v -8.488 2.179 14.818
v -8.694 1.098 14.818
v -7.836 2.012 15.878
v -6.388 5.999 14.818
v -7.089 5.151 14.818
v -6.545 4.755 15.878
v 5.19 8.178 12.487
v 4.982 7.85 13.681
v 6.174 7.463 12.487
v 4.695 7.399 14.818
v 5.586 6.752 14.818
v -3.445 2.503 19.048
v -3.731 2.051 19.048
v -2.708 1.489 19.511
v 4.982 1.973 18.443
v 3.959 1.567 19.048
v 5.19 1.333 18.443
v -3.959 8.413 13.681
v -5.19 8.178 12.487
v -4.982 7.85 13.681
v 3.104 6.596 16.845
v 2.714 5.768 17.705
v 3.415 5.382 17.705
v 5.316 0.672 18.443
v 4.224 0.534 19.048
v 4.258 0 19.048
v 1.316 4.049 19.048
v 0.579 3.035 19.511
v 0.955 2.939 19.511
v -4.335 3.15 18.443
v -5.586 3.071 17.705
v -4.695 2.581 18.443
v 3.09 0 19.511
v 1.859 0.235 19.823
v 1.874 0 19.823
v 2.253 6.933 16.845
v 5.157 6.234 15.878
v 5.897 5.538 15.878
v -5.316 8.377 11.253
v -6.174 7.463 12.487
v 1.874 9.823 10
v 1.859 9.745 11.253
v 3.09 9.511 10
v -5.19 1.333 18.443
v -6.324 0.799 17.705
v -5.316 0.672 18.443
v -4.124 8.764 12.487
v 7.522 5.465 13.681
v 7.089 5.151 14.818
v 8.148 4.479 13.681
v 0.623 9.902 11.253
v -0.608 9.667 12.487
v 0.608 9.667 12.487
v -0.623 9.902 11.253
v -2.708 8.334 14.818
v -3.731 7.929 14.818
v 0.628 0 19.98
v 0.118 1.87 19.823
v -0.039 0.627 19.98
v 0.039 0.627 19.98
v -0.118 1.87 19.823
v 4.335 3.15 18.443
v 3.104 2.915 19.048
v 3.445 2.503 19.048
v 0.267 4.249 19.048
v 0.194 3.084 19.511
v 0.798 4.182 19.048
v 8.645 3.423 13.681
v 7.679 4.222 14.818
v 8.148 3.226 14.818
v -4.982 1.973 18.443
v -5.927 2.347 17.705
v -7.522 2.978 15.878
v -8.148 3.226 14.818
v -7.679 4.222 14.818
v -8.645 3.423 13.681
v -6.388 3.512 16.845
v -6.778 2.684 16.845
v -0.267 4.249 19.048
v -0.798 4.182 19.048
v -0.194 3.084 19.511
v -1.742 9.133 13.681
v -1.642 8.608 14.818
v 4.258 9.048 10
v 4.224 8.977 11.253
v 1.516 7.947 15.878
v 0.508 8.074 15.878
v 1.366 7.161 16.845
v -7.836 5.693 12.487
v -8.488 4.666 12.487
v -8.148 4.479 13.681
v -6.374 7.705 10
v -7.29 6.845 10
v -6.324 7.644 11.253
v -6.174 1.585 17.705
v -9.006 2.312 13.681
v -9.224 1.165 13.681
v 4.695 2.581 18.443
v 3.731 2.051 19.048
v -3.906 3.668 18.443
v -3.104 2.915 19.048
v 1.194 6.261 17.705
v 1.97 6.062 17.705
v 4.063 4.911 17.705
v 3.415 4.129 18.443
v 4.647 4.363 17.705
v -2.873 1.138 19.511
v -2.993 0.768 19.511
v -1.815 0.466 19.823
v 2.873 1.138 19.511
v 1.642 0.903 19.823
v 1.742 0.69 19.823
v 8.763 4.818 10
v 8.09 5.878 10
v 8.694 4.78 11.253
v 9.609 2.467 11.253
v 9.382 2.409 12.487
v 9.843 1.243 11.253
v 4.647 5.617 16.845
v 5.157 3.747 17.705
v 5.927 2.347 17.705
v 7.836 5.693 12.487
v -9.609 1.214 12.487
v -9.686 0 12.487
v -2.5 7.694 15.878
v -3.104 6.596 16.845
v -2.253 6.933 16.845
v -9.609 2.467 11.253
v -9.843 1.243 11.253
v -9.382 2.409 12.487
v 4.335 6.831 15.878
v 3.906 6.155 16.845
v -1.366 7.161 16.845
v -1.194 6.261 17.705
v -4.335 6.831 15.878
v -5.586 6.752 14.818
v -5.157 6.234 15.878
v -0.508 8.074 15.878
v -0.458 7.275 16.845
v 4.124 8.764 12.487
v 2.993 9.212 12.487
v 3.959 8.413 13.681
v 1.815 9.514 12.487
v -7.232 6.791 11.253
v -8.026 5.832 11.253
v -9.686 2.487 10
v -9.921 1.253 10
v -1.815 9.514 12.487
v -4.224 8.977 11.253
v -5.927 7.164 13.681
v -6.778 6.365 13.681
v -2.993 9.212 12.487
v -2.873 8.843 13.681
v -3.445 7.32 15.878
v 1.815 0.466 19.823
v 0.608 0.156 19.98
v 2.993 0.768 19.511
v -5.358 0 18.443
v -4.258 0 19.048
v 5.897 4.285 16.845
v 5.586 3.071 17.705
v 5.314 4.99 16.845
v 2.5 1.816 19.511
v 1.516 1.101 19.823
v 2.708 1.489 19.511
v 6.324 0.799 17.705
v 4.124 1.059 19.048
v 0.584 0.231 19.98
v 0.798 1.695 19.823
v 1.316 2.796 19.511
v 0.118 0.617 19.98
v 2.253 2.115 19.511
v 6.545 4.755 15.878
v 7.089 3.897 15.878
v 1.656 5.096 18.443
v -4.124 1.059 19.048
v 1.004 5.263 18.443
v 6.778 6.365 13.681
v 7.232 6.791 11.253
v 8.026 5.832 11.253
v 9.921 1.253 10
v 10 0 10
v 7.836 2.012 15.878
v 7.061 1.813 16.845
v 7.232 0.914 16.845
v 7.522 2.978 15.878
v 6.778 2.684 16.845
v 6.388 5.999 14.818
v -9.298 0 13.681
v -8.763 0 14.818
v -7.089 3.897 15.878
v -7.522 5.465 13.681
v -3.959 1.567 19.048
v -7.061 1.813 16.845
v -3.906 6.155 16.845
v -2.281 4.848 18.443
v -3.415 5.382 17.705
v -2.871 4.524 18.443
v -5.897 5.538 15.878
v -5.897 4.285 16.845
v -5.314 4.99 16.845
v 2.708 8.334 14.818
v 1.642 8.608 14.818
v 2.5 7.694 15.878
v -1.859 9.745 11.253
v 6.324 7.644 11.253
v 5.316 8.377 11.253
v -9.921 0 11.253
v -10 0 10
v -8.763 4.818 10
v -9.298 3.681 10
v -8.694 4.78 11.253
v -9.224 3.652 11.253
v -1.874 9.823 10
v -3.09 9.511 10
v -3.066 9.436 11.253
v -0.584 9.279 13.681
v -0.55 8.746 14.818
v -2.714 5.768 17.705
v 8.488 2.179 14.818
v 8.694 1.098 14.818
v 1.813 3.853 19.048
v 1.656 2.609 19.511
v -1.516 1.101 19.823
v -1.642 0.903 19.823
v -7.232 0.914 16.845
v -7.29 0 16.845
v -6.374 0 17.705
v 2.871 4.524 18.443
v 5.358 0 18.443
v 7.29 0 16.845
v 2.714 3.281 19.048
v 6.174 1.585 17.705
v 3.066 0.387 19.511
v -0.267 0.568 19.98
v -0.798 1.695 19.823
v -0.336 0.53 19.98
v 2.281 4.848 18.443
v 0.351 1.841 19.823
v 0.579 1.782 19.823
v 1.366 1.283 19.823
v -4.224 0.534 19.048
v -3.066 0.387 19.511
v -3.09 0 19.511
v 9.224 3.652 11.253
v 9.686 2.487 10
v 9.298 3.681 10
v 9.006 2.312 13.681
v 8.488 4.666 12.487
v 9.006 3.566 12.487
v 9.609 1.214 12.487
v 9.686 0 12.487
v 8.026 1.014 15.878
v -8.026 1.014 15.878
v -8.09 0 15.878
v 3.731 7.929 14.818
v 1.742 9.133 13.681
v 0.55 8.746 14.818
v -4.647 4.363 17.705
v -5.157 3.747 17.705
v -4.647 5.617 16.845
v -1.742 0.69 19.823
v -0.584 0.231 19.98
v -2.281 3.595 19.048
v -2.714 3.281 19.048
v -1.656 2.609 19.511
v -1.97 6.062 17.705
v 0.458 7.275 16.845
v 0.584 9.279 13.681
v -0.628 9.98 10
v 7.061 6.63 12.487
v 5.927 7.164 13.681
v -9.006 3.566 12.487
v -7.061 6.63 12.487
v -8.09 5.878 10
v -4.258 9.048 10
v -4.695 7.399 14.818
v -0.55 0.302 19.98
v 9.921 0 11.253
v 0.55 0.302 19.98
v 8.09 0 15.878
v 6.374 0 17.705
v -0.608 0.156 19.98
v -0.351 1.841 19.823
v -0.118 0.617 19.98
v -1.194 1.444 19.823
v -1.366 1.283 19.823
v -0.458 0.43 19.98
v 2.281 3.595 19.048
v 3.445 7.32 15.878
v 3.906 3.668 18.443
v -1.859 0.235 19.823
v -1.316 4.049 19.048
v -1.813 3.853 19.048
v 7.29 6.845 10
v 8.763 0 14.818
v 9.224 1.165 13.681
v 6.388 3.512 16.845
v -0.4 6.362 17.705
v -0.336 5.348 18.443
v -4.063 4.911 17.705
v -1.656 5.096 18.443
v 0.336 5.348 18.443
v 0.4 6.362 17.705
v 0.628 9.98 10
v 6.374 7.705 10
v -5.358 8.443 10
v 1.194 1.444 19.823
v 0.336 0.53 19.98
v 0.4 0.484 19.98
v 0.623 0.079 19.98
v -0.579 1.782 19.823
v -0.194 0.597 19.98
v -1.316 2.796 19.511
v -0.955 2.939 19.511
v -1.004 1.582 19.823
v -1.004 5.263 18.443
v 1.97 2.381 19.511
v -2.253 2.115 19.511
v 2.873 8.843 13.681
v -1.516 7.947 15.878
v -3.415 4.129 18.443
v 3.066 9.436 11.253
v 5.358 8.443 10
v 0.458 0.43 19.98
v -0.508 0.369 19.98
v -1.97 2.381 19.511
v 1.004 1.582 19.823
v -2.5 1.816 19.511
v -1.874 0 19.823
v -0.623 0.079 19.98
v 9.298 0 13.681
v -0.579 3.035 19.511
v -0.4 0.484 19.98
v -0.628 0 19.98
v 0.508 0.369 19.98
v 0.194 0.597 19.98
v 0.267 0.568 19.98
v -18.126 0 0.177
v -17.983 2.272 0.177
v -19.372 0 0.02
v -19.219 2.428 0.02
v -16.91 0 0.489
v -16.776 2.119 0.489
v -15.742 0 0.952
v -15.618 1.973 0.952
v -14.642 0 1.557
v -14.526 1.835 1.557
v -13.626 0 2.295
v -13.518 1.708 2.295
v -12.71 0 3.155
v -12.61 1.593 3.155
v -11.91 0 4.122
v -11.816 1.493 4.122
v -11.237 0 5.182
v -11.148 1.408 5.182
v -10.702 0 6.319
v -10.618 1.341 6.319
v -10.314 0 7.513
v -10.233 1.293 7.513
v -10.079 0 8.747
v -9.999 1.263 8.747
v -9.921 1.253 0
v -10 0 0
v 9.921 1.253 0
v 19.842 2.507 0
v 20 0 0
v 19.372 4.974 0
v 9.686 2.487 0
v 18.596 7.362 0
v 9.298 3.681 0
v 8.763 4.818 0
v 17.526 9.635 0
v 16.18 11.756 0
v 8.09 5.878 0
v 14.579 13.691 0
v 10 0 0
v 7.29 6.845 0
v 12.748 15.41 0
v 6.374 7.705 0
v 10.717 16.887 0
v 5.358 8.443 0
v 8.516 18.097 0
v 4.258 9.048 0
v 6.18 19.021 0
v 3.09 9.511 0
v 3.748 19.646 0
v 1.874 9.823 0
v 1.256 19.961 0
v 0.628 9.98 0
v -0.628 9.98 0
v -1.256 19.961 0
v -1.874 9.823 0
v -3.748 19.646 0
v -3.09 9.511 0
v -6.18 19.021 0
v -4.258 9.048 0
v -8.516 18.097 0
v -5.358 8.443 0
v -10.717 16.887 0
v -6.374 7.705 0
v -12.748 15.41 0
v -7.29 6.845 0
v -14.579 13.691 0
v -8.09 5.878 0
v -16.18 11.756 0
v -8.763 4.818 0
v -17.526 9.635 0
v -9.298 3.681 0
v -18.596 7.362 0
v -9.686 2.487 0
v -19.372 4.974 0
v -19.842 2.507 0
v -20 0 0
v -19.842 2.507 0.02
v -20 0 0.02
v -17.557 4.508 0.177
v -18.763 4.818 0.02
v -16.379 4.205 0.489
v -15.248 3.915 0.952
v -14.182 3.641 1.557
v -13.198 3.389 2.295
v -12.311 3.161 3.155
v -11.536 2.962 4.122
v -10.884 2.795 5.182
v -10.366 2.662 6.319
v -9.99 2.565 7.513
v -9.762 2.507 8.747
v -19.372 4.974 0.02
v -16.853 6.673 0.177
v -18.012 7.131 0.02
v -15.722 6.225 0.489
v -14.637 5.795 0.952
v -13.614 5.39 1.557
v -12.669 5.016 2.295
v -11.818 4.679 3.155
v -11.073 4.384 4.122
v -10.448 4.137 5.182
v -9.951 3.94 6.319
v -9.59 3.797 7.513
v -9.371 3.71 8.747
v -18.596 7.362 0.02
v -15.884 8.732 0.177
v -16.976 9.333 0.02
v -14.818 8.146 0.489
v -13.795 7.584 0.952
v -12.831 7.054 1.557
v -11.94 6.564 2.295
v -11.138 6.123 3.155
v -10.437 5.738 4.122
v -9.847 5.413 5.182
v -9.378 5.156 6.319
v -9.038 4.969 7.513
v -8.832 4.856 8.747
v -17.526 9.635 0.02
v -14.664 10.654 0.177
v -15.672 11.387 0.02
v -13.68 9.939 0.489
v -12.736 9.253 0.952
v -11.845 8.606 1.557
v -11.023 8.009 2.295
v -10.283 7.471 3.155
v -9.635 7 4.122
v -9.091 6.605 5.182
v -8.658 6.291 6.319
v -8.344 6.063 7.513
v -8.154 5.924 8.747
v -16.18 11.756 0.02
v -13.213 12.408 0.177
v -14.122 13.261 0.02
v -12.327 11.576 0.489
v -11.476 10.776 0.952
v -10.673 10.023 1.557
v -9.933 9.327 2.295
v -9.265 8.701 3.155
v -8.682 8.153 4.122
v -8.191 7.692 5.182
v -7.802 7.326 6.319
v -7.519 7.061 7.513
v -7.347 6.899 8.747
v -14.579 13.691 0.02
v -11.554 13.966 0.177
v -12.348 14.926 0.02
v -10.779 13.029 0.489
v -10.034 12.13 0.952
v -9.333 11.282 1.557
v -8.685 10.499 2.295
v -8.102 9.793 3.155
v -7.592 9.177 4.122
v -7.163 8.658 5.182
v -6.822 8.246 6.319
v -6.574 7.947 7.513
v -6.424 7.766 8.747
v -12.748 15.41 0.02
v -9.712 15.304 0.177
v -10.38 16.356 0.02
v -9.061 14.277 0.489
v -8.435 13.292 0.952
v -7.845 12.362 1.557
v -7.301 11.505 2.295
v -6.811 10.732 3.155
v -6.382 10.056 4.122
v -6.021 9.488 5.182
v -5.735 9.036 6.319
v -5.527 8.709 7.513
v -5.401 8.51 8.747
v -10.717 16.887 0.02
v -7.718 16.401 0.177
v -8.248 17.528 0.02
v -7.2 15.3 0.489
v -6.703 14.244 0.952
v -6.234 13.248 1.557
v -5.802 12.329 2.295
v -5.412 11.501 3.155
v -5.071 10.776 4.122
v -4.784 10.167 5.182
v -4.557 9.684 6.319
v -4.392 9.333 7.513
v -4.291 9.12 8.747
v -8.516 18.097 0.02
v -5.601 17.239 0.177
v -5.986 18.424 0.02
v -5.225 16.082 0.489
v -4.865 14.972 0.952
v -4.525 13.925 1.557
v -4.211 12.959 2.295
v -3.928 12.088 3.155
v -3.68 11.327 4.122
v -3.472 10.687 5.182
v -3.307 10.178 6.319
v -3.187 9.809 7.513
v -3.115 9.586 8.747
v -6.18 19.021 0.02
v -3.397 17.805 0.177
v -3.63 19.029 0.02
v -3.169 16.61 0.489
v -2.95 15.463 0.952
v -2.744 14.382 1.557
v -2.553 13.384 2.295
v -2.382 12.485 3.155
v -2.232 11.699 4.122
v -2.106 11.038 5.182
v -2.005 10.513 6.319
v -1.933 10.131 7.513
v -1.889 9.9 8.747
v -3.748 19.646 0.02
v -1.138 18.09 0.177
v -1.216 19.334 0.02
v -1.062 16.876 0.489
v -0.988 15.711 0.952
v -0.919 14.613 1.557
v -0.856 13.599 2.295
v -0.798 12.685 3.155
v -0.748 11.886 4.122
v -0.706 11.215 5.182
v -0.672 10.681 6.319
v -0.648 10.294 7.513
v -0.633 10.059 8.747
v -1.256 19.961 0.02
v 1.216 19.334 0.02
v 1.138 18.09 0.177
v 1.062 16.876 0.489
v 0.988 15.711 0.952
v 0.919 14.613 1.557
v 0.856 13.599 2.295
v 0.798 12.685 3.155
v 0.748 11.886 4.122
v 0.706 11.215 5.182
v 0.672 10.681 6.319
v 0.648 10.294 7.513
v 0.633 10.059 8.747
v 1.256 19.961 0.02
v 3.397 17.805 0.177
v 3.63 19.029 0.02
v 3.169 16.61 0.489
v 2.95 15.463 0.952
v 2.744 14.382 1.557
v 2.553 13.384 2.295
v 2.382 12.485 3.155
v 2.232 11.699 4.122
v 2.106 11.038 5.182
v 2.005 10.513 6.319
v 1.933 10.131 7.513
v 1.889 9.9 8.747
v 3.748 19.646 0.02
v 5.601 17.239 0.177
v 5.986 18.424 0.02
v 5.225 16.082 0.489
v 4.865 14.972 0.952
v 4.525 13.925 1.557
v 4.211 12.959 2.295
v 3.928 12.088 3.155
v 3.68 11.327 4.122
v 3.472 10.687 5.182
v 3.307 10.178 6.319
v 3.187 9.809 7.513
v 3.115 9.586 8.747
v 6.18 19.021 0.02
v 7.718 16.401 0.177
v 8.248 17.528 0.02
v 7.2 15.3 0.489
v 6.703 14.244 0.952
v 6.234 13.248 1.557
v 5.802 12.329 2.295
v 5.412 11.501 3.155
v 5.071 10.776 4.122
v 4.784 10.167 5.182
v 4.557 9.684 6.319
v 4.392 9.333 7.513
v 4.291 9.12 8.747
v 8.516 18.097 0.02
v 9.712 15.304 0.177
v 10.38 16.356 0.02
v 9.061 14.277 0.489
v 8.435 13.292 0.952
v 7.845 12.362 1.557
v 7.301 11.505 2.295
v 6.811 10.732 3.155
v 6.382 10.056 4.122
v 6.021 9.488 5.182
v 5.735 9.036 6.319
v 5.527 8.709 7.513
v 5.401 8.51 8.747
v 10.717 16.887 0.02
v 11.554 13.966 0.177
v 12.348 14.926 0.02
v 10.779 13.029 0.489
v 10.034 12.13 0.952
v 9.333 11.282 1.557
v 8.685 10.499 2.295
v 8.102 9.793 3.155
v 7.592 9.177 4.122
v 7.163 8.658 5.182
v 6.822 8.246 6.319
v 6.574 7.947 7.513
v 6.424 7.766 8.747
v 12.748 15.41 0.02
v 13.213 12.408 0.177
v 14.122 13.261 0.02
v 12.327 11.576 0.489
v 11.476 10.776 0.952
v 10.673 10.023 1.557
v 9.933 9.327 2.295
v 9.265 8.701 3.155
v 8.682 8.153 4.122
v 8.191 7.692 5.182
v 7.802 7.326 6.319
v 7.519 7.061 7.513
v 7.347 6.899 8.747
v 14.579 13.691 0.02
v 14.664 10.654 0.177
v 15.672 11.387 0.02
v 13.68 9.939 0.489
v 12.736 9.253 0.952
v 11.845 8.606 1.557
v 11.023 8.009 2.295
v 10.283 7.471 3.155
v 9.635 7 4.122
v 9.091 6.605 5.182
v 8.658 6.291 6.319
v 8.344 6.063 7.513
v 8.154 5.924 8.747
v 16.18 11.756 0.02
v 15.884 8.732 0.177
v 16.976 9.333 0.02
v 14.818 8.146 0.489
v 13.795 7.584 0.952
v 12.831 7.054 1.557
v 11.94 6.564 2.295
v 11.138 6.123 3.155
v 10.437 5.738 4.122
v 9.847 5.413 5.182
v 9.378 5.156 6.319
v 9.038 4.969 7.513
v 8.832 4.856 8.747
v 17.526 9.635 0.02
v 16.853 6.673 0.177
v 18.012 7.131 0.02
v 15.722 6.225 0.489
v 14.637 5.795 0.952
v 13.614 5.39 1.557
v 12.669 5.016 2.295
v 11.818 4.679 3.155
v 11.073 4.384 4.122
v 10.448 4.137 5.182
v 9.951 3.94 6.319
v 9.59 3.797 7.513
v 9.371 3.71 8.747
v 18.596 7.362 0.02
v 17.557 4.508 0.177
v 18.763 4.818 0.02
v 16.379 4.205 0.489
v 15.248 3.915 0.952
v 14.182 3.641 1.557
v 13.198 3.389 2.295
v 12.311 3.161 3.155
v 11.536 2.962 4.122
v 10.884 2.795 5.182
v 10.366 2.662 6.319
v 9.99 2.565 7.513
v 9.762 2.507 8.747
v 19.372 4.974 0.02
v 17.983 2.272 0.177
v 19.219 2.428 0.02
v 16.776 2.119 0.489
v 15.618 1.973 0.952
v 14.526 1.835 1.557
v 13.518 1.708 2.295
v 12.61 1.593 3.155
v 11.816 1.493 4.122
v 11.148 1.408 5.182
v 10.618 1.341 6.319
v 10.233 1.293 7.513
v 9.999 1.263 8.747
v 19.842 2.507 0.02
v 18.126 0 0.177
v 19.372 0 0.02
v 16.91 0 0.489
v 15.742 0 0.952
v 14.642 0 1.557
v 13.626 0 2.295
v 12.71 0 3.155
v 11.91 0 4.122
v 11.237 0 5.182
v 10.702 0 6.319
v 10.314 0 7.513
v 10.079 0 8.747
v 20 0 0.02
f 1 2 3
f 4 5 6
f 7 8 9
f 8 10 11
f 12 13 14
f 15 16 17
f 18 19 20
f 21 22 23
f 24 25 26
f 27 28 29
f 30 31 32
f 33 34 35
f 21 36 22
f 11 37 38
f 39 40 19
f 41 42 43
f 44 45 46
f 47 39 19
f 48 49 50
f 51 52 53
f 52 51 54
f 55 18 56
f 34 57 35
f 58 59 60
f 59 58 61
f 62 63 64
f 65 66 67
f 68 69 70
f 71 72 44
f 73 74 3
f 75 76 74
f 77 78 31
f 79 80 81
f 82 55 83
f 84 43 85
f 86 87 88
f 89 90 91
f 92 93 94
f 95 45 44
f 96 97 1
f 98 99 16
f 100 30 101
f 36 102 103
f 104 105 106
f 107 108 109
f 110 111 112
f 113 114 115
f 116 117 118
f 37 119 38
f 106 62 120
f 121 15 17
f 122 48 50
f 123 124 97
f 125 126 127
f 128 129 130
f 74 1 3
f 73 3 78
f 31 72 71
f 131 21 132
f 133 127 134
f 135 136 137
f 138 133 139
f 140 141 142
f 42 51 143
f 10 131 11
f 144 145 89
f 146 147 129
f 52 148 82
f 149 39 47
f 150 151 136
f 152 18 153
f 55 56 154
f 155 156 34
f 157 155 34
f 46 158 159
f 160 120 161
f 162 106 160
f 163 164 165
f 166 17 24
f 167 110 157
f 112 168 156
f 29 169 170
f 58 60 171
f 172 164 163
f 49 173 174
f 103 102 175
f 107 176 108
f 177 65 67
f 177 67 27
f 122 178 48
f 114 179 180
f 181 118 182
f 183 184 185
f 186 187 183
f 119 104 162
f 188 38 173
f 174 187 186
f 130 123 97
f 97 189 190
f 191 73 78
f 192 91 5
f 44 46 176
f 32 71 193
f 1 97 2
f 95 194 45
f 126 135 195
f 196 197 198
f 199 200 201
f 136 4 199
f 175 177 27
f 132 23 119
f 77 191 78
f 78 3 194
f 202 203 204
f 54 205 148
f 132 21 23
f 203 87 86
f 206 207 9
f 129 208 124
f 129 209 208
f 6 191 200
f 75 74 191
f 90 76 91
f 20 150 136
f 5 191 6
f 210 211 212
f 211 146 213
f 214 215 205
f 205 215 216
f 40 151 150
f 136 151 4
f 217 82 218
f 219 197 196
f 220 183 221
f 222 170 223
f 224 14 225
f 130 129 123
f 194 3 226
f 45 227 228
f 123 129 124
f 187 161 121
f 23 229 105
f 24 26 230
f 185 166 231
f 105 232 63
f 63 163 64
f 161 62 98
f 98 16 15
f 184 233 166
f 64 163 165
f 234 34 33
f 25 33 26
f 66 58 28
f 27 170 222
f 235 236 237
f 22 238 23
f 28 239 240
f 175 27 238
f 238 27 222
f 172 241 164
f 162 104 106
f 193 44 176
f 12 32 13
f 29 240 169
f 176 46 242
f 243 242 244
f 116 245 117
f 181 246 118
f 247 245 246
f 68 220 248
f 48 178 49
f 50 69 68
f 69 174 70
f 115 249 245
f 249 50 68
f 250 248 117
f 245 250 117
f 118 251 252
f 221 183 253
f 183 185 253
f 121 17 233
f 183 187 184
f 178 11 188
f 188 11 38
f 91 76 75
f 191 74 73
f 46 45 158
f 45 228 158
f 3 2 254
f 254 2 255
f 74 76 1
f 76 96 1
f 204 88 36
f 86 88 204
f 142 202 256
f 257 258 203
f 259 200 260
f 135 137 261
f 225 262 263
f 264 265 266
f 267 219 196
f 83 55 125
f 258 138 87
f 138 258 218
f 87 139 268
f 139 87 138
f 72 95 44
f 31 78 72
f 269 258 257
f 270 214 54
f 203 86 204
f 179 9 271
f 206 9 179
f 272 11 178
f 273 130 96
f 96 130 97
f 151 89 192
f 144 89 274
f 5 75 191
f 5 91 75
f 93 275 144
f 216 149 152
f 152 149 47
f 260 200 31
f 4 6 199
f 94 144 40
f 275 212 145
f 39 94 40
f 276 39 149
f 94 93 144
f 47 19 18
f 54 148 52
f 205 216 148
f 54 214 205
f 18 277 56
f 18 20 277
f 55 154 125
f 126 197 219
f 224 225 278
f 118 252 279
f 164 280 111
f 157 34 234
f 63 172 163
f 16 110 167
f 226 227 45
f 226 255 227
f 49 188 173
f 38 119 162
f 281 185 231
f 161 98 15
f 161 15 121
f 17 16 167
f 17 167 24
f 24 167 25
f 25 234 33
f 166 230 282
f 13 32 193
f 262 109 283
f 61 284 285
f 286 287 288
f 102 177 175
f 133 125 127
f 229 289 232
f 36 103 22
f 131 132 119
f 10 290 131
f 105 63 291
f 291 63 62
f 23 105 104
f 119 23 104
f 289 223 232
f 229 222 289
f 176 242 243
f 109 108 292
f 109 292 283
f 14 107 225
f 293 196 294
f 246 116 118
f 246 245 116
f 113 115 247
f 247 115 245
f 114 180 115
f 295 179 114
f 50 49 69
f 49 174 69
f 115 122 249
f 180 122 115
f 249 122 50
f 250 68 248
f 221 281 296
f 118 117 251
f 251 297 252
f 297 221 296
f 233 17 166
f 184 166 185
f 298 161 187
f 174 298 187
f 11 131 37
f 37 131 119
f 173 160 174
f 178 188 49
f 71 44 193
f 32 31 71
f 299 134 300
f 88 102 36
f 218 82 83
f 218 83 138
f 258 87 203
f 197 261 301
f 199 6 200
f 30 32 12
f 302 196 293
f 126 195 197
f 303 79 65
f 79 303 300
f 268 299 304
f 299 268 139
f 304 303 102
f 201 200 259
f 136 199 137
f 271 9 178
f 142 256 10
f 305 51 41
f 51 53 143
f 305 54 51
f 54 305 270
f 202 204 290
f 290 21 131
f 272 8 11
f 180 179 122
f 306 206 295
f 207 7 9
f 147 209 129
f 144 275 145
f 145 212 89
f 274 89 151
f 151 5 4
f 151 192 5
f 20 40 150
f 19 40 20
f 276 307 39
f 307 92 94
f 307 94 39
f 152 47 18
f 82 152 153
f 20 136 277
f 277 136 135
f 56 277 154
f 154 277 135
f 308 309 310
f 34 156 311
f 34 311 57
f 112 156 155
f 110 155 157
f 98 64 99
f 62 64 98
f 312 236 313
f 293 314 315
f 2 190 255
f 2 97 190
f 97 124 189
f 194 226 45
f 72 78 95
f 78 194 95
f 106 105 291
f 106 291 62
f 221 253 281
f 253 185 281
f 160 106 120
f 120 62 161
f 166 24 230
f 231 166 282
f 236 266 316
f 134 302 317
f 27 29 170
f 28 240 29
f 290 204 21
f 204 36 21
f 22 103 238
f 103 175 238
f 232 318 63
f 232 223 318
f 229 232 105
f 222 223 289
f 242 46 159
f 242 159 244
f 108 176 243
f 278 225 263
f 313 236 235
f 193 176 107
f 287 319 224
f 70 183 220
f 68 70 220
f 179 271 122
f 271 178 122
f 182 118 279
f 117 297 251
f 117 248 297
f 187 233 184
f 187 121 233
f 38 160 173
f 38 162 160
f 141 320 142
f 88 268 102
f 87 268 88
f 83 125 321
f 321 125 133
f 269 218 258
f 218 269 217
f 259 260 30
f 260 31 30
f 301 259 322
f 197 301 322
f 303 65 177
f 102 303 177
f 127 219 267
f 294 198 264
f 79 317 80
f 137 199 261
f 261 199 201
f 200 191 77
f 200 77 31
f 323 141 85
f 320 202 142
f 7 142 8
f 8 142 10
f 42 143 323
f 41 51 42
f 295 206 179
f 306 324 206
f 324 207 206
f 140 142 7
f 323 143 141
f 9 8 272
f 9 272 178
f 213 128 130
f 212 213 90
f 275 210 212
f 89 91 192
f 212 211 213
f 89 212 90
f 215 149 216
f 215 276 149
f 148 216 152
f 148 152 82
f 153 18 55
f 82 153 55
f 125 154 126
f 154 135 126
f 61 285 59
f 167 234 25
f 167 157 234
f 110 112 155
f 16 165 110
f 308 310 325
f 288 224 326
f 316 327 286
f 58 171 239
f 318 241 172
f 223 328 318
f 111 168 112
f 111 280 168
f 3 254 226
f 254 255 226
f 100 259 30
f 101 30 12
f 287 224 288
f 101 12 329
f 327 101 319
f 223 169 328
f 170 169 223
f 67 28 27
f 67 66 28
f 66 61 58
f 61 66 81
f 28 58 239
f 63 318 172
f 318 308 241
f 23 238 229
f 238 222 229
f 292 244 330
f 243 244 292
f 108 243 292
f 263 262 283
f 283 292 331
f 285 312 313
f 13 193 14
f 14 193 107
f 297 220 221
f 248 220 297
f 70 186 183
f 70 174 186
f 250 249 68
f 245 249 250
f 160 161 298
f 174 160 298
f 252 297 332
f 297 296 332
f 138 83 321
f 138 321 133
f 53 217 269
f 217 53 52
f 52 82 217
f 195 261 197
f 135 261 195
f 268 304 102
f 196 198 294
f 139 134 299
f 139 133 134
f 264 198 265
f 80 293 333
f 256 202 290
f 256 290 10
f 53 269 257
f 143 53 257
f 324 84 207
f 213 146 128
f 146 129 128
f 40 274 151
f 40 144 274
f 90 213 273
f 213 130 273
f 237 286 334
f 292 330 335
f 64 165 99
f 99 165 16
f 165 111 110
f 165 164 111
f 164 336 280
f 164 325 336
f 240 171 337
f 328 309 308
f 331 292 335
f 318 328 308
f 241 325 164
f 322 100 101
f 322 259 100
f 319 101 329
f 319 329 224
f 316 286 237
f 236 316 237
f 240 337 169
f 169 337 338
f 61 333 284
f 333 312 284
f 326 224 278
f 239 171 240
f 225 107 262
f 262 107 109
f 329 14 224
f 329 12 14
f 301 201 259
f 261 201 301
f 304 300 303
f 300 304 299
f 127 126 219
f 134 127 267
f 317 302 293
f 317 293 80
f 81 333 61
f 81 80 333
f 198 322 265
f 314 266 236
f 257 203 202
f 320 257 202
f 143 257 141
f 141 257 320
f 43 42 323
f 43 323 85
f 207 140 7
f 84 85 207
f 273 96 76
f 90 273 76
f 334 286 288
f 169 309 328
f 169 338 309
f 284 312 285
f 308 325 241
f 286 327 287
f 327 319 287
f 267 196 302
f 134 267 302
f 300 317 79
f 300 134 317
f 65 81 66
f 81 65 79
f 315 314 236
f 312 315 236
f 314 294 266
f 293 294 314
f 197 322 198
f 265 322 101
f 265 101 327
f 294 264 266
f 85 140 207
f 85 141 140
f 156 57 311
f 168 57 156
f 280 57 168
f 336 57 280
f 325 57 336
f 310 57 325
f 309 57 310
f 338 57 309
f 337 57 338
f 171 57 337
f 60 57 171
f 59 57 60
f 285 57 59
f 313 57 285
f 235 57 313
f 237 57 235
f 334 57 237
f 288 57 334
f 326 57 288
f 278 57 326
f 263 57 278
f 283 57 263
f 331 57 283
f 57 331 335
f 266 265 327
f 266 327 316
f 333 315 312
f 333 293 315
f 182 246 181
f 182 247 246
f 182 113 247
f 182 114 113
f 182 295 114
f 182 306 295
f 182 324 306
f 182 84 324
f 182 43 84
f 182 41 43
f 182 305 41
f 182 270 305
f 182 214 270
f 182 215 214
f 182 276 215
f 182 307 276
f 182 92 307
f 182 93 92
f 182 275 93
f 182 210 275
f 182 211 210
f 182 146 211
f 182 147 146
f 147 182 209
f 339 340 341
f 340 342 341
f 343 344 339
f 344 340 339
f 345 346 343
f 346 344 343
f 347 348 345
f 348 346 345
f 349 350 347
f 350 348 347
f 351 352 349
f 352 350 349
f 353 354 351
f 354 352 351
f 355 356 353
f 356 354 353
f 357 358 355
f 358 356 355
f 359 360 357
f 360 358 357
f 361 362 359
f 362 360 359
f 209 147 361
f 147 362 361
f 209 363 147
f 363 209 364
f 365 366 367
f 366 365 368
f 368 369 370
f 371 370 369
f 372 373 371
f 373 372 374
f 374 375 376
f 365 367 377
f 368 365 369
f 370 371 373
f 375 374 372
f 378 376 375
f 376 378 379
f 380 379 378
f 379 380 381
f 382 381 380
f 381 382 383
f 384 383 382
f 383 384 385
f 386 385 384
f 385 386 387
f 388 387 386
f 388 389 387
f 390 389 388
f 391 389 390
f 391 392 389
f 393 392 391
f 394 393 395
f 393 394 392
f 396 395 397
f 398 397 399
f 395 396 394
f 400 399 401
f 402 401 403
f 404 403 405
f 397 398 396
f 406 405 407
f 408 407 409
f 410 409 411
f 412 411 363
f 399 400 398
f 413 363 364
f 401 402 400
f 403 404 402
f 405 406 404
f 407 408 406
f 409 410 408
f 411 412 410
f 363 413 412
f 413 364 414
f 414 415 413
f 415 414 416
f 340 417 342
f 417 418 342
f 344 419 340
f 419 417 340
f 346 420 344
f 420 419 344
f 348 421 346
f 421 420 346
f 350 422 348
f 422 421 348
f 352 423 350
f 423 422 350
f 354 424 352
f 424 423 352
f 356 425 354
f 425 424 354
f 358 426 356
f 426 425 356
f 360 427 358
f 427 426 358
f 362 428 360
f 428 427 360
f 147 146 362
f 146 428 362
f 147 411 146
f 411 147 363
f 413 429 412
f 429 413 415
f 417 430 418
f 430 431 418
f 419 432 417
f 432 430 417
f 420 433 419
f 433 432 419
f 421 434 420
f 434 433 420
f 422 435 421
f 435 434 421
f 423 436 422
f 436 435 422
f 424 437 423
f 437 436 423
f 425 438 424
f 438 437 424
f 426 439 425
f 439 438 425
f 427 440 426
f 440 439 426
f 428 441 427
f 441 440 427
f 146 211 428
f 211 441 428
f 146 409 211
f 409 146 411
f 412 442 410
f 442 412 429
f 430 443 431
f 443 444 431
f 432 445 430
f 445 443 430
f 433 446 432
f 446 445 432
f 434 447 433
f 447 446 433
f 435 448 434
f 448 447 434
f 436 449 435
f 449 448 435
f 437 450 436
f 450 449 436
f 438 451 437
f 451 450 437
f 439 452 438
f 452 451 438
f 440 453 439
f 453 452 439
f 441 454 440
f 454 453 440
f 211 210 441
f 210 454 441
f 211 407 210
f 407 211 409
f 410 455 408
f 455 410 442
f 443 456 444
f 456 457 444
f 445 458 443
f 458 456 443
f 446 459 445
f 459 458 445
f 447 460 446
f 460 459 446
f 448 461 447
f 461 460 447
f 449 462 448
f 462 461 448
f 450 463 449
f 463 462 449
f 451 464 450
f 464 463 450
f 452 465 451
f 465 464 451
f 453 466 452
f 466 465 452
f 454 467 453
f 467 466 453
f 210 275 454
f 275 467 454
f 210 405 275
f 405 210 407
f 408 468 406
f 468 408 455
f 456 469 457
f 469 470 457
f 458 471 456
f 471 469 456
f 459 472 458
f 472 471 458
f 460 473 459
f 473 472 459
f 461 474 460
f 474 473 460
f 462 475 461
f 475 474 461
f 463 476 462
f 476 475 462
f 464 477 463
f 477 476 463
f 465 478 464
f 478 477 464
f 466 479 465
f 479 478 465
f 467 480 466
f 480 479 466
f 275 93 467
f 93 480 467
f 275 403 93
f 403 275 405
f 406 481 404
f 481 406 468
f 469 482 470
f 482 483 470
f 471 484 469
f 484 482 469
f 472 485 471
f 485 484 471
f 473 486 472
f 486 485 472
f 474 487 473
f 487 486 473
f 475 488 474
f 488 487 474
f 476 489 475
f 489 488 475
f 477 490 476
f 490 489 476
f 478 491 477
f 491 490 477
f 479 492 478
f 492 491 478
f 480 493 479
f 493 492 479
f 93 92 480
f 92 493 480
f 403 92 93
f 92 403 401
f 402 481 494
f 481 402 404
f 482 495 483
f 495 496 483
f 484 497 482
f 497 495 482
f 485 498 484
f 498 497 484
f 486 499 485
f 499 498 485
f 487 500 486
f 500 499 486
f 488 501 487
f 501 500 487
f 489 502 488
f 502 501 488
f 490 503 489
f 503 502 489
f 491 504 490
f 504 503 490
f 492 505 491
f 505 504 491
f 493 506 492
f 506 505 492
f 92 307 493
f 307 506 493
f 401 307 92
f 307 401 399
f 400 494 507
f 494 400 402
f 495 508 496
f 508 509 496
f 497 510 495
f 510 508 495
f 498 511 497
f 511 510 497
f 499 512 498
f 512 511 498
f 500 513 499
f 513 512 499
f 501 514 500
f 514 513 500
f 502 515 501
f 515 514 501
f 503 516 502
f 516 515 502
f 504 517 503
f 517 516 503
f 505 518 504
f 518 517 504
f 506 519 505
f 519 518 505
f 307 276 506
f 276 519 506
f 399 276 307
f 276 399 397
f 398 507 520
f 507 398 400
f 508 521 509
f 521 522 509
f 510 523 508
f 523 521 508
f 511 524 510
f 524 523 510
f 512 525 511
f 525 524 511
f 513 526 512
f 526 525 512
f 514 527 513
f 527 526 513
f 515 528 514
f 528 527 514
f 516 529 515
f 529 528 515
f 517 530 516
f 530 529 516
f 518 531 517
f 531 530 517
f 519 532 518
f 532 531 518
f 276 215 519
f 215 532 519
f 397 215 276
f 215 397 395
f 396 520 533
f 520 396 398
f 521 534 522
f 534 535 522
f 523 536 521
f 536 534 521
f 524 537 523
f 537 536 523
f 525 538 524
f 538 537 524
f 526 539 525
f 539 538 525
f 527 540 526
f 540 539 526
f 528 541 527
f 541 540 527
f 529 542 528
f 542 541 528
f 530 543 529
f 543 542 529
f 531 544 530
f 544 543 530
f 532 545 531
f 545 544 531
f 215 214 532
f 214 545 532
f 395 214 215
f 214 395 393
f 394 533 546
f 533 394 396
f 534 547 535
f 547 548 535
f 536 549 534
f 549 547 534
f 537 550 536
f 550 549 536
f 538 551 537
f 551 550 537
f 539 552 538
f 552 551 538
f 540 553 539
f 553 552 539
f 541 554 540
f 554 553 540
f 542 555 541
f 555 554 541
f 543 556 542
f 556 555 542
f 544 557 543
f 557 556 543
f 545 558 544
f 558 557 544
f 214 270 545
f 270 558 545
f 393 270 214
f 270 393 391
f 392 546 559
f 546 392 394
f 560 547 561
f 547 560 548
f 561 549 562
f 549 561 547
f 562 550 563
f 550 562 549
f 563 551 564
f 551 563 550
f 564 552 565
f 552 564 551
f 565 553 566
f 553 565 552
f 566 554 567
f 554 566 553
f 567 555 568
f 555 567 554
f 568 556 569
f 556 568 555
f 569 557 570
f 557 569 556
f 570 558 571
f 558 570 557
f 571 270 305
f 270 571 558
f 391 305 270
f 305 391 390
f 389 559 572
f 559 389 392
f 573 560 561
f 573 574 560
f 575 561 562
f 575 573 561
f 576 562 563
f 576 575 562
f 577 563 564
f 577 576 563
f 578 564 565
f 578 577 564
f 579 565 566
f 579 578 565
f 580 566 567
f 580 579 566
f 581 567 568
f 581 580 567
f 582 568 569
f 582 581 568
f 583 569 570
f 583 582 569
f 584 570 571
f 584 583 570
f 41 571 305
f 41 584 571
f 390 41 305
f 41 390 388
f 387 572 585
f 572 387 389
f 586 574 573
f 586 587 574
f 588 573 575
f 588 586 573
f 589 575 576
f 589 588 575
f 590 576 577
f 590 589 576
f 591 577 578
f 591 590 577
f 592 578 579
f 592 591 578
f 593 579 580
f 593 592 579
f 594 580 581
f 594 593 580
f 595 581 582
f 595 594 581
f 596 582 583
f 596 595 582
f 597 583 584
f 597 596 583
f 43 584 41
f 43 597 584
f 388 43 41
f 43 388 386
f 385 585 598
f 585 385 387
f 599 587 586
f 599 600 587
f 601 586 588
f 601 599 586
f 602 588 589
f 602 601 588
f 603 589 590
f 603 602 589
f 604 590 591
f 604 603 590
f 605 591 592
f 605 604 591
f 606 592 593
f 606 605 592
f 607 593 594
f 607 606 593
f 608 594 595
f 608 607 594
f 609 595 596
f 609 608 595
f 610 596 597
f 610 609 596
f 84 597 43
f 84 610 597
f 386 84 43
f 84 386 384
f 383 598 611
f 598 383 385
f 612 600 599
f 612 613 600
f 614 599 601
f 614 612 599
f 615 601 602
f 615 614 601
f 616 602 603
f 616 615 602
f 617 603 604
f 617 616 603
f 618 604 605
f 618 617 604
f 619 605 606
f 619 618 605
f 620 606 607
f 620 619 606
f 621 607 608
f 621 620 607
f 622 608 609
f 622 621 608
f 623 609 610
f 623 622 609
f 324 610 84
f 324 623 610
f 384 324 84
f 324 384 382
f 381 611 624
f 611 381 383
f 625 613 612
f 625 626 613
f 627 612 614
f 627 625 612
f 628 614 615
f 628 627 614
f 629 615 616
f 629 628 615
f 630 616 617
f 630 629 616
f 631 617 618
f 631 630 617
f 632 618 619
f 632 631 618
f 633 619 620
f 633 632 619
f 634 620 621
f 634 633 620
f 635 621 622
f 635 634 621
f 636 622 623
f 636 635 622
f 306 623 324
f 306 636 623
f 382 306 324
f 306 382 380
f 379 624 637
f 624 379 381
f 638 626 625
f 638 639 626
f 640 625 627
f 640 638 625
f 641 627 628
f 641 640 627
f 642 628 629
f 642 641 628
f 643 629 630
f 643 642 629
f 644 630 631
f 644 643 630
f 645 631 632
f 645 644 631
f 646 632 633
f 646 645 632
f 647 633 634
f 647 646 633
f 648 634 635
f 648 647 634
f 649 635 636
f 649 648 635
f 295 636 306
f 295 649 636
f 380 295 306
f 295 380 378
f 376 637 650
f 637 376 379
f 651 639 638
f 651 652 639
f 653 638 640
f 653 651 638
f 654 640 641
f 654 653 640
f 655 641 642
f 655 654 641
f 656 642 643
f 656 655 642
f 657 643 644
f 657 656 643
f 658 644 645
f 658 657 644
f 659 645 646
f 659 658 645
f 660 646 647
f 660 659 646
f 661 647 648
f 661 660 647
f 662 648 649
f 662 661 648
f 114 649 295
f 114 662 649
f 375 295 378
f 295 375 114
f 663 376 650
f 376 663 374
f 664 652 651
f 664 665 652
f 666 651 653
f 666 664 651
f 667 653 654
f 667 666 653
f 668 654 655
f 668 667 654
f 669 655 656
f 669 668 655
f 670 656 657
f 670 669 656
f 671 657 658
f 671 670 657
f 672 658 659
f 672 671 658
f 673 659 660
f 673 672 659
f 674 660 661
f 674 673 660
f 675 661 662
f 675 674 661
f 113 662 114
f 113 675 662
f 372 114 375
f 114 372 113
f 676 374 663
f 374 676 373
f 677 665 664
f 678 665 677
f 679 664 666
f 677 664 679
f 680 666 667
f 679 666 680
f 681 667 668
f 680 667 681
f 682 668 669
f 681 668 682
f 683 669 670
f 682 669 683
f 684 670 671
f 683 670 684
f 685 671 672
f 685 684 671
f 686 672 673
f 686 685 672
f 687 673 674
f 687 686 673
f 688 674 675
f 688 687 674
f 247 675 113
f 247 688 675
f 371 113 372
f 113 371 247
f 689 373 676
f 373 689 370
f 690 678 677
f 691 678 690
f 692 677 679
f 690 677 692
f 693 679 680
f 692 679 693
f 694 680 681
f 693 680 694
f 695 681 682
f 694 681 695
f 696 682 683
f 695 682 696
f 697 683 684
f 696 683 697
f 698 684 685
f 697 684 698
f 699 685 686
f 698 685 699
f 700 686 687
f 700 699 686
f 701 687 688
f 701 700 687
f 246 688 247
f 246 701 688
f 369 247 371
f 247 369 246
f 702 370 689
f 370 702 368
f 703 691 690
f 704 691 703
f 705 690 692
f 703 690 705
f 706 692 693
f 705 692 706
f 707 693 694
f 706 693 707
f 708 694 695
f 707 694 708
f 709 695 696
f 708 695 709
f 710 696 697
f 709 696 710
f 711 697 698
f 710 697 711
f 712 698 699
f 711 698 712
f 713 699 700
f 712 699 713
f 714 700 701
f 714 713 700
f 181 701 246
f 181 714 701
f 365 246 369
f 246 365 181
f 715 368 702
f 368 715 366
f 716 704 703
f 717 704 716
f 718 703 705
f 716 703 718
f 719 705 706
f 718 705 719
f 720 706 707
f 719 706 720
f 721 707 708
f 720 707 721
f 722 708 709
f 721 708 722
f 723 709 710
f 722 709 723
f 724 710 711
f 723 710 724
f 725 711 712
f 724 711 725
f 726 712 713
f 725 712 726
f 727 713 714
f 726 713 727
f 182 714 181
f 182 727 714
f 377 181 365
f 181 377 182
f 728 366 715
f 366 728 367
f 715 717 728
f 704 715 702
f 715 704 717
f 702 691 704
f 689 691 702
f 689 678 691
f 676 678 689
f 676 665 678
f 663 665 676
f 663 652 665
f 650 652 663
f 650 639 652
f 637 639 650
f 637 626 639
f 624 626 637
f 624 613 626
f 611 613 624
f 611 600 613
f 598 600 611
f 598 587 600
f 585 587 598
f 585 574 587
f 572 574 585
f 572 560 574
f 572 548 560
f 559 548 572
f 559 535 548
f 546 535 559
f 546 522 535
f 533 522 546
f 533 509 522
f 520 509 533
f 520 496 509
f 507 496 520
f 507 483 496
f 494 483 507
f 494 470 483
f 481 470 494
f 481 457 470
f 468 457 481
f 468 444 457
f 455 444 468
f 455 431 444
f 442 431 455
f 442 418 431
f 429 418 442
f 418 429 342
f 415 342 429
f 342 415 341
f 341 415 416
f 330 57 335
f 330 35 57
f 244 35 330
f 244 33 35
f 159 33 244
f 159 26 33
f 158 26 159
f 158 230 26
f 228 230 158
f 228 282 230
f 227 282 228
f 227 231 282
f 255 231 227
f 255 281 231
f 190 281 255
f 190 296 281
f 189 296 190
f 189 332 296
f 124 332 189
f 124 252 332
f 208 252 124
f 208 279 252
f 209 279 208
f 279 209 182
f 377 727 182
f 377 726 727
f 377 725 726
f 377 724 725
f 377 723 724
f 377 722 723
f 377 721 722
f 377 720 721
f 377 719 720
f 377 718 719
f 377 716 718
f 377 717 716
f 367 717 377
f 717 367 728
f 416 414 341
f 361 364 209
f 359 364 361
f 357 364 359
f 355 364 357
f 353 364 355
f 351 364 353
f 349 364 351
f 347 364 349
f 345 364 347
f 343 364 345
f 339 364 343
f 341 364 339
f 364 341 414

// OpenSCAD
nut_rad = 10;

intersection(){
	union(){
//		cylinder(r = nut_rad, h = 10, $fn = 50);
		translate([0,0,10])
		intersection(){
			sphere(r = nut_rad, $fn = 50);
			translate([-nut_rad,-nut_rad,0])
			cube(nut_rad*2);
		}
		rotate_extrude($fn = 50){
			translate([nut_rad,0])
			difference(){
				square([nut_rad,nut_rad]);
				translate([nut_rad,nut_rad])
				circle(r = nut_rad);	
			}
		}
	}
	translate([-nut_rad*2,0,0])
	cube(nut_rad*4);
}
